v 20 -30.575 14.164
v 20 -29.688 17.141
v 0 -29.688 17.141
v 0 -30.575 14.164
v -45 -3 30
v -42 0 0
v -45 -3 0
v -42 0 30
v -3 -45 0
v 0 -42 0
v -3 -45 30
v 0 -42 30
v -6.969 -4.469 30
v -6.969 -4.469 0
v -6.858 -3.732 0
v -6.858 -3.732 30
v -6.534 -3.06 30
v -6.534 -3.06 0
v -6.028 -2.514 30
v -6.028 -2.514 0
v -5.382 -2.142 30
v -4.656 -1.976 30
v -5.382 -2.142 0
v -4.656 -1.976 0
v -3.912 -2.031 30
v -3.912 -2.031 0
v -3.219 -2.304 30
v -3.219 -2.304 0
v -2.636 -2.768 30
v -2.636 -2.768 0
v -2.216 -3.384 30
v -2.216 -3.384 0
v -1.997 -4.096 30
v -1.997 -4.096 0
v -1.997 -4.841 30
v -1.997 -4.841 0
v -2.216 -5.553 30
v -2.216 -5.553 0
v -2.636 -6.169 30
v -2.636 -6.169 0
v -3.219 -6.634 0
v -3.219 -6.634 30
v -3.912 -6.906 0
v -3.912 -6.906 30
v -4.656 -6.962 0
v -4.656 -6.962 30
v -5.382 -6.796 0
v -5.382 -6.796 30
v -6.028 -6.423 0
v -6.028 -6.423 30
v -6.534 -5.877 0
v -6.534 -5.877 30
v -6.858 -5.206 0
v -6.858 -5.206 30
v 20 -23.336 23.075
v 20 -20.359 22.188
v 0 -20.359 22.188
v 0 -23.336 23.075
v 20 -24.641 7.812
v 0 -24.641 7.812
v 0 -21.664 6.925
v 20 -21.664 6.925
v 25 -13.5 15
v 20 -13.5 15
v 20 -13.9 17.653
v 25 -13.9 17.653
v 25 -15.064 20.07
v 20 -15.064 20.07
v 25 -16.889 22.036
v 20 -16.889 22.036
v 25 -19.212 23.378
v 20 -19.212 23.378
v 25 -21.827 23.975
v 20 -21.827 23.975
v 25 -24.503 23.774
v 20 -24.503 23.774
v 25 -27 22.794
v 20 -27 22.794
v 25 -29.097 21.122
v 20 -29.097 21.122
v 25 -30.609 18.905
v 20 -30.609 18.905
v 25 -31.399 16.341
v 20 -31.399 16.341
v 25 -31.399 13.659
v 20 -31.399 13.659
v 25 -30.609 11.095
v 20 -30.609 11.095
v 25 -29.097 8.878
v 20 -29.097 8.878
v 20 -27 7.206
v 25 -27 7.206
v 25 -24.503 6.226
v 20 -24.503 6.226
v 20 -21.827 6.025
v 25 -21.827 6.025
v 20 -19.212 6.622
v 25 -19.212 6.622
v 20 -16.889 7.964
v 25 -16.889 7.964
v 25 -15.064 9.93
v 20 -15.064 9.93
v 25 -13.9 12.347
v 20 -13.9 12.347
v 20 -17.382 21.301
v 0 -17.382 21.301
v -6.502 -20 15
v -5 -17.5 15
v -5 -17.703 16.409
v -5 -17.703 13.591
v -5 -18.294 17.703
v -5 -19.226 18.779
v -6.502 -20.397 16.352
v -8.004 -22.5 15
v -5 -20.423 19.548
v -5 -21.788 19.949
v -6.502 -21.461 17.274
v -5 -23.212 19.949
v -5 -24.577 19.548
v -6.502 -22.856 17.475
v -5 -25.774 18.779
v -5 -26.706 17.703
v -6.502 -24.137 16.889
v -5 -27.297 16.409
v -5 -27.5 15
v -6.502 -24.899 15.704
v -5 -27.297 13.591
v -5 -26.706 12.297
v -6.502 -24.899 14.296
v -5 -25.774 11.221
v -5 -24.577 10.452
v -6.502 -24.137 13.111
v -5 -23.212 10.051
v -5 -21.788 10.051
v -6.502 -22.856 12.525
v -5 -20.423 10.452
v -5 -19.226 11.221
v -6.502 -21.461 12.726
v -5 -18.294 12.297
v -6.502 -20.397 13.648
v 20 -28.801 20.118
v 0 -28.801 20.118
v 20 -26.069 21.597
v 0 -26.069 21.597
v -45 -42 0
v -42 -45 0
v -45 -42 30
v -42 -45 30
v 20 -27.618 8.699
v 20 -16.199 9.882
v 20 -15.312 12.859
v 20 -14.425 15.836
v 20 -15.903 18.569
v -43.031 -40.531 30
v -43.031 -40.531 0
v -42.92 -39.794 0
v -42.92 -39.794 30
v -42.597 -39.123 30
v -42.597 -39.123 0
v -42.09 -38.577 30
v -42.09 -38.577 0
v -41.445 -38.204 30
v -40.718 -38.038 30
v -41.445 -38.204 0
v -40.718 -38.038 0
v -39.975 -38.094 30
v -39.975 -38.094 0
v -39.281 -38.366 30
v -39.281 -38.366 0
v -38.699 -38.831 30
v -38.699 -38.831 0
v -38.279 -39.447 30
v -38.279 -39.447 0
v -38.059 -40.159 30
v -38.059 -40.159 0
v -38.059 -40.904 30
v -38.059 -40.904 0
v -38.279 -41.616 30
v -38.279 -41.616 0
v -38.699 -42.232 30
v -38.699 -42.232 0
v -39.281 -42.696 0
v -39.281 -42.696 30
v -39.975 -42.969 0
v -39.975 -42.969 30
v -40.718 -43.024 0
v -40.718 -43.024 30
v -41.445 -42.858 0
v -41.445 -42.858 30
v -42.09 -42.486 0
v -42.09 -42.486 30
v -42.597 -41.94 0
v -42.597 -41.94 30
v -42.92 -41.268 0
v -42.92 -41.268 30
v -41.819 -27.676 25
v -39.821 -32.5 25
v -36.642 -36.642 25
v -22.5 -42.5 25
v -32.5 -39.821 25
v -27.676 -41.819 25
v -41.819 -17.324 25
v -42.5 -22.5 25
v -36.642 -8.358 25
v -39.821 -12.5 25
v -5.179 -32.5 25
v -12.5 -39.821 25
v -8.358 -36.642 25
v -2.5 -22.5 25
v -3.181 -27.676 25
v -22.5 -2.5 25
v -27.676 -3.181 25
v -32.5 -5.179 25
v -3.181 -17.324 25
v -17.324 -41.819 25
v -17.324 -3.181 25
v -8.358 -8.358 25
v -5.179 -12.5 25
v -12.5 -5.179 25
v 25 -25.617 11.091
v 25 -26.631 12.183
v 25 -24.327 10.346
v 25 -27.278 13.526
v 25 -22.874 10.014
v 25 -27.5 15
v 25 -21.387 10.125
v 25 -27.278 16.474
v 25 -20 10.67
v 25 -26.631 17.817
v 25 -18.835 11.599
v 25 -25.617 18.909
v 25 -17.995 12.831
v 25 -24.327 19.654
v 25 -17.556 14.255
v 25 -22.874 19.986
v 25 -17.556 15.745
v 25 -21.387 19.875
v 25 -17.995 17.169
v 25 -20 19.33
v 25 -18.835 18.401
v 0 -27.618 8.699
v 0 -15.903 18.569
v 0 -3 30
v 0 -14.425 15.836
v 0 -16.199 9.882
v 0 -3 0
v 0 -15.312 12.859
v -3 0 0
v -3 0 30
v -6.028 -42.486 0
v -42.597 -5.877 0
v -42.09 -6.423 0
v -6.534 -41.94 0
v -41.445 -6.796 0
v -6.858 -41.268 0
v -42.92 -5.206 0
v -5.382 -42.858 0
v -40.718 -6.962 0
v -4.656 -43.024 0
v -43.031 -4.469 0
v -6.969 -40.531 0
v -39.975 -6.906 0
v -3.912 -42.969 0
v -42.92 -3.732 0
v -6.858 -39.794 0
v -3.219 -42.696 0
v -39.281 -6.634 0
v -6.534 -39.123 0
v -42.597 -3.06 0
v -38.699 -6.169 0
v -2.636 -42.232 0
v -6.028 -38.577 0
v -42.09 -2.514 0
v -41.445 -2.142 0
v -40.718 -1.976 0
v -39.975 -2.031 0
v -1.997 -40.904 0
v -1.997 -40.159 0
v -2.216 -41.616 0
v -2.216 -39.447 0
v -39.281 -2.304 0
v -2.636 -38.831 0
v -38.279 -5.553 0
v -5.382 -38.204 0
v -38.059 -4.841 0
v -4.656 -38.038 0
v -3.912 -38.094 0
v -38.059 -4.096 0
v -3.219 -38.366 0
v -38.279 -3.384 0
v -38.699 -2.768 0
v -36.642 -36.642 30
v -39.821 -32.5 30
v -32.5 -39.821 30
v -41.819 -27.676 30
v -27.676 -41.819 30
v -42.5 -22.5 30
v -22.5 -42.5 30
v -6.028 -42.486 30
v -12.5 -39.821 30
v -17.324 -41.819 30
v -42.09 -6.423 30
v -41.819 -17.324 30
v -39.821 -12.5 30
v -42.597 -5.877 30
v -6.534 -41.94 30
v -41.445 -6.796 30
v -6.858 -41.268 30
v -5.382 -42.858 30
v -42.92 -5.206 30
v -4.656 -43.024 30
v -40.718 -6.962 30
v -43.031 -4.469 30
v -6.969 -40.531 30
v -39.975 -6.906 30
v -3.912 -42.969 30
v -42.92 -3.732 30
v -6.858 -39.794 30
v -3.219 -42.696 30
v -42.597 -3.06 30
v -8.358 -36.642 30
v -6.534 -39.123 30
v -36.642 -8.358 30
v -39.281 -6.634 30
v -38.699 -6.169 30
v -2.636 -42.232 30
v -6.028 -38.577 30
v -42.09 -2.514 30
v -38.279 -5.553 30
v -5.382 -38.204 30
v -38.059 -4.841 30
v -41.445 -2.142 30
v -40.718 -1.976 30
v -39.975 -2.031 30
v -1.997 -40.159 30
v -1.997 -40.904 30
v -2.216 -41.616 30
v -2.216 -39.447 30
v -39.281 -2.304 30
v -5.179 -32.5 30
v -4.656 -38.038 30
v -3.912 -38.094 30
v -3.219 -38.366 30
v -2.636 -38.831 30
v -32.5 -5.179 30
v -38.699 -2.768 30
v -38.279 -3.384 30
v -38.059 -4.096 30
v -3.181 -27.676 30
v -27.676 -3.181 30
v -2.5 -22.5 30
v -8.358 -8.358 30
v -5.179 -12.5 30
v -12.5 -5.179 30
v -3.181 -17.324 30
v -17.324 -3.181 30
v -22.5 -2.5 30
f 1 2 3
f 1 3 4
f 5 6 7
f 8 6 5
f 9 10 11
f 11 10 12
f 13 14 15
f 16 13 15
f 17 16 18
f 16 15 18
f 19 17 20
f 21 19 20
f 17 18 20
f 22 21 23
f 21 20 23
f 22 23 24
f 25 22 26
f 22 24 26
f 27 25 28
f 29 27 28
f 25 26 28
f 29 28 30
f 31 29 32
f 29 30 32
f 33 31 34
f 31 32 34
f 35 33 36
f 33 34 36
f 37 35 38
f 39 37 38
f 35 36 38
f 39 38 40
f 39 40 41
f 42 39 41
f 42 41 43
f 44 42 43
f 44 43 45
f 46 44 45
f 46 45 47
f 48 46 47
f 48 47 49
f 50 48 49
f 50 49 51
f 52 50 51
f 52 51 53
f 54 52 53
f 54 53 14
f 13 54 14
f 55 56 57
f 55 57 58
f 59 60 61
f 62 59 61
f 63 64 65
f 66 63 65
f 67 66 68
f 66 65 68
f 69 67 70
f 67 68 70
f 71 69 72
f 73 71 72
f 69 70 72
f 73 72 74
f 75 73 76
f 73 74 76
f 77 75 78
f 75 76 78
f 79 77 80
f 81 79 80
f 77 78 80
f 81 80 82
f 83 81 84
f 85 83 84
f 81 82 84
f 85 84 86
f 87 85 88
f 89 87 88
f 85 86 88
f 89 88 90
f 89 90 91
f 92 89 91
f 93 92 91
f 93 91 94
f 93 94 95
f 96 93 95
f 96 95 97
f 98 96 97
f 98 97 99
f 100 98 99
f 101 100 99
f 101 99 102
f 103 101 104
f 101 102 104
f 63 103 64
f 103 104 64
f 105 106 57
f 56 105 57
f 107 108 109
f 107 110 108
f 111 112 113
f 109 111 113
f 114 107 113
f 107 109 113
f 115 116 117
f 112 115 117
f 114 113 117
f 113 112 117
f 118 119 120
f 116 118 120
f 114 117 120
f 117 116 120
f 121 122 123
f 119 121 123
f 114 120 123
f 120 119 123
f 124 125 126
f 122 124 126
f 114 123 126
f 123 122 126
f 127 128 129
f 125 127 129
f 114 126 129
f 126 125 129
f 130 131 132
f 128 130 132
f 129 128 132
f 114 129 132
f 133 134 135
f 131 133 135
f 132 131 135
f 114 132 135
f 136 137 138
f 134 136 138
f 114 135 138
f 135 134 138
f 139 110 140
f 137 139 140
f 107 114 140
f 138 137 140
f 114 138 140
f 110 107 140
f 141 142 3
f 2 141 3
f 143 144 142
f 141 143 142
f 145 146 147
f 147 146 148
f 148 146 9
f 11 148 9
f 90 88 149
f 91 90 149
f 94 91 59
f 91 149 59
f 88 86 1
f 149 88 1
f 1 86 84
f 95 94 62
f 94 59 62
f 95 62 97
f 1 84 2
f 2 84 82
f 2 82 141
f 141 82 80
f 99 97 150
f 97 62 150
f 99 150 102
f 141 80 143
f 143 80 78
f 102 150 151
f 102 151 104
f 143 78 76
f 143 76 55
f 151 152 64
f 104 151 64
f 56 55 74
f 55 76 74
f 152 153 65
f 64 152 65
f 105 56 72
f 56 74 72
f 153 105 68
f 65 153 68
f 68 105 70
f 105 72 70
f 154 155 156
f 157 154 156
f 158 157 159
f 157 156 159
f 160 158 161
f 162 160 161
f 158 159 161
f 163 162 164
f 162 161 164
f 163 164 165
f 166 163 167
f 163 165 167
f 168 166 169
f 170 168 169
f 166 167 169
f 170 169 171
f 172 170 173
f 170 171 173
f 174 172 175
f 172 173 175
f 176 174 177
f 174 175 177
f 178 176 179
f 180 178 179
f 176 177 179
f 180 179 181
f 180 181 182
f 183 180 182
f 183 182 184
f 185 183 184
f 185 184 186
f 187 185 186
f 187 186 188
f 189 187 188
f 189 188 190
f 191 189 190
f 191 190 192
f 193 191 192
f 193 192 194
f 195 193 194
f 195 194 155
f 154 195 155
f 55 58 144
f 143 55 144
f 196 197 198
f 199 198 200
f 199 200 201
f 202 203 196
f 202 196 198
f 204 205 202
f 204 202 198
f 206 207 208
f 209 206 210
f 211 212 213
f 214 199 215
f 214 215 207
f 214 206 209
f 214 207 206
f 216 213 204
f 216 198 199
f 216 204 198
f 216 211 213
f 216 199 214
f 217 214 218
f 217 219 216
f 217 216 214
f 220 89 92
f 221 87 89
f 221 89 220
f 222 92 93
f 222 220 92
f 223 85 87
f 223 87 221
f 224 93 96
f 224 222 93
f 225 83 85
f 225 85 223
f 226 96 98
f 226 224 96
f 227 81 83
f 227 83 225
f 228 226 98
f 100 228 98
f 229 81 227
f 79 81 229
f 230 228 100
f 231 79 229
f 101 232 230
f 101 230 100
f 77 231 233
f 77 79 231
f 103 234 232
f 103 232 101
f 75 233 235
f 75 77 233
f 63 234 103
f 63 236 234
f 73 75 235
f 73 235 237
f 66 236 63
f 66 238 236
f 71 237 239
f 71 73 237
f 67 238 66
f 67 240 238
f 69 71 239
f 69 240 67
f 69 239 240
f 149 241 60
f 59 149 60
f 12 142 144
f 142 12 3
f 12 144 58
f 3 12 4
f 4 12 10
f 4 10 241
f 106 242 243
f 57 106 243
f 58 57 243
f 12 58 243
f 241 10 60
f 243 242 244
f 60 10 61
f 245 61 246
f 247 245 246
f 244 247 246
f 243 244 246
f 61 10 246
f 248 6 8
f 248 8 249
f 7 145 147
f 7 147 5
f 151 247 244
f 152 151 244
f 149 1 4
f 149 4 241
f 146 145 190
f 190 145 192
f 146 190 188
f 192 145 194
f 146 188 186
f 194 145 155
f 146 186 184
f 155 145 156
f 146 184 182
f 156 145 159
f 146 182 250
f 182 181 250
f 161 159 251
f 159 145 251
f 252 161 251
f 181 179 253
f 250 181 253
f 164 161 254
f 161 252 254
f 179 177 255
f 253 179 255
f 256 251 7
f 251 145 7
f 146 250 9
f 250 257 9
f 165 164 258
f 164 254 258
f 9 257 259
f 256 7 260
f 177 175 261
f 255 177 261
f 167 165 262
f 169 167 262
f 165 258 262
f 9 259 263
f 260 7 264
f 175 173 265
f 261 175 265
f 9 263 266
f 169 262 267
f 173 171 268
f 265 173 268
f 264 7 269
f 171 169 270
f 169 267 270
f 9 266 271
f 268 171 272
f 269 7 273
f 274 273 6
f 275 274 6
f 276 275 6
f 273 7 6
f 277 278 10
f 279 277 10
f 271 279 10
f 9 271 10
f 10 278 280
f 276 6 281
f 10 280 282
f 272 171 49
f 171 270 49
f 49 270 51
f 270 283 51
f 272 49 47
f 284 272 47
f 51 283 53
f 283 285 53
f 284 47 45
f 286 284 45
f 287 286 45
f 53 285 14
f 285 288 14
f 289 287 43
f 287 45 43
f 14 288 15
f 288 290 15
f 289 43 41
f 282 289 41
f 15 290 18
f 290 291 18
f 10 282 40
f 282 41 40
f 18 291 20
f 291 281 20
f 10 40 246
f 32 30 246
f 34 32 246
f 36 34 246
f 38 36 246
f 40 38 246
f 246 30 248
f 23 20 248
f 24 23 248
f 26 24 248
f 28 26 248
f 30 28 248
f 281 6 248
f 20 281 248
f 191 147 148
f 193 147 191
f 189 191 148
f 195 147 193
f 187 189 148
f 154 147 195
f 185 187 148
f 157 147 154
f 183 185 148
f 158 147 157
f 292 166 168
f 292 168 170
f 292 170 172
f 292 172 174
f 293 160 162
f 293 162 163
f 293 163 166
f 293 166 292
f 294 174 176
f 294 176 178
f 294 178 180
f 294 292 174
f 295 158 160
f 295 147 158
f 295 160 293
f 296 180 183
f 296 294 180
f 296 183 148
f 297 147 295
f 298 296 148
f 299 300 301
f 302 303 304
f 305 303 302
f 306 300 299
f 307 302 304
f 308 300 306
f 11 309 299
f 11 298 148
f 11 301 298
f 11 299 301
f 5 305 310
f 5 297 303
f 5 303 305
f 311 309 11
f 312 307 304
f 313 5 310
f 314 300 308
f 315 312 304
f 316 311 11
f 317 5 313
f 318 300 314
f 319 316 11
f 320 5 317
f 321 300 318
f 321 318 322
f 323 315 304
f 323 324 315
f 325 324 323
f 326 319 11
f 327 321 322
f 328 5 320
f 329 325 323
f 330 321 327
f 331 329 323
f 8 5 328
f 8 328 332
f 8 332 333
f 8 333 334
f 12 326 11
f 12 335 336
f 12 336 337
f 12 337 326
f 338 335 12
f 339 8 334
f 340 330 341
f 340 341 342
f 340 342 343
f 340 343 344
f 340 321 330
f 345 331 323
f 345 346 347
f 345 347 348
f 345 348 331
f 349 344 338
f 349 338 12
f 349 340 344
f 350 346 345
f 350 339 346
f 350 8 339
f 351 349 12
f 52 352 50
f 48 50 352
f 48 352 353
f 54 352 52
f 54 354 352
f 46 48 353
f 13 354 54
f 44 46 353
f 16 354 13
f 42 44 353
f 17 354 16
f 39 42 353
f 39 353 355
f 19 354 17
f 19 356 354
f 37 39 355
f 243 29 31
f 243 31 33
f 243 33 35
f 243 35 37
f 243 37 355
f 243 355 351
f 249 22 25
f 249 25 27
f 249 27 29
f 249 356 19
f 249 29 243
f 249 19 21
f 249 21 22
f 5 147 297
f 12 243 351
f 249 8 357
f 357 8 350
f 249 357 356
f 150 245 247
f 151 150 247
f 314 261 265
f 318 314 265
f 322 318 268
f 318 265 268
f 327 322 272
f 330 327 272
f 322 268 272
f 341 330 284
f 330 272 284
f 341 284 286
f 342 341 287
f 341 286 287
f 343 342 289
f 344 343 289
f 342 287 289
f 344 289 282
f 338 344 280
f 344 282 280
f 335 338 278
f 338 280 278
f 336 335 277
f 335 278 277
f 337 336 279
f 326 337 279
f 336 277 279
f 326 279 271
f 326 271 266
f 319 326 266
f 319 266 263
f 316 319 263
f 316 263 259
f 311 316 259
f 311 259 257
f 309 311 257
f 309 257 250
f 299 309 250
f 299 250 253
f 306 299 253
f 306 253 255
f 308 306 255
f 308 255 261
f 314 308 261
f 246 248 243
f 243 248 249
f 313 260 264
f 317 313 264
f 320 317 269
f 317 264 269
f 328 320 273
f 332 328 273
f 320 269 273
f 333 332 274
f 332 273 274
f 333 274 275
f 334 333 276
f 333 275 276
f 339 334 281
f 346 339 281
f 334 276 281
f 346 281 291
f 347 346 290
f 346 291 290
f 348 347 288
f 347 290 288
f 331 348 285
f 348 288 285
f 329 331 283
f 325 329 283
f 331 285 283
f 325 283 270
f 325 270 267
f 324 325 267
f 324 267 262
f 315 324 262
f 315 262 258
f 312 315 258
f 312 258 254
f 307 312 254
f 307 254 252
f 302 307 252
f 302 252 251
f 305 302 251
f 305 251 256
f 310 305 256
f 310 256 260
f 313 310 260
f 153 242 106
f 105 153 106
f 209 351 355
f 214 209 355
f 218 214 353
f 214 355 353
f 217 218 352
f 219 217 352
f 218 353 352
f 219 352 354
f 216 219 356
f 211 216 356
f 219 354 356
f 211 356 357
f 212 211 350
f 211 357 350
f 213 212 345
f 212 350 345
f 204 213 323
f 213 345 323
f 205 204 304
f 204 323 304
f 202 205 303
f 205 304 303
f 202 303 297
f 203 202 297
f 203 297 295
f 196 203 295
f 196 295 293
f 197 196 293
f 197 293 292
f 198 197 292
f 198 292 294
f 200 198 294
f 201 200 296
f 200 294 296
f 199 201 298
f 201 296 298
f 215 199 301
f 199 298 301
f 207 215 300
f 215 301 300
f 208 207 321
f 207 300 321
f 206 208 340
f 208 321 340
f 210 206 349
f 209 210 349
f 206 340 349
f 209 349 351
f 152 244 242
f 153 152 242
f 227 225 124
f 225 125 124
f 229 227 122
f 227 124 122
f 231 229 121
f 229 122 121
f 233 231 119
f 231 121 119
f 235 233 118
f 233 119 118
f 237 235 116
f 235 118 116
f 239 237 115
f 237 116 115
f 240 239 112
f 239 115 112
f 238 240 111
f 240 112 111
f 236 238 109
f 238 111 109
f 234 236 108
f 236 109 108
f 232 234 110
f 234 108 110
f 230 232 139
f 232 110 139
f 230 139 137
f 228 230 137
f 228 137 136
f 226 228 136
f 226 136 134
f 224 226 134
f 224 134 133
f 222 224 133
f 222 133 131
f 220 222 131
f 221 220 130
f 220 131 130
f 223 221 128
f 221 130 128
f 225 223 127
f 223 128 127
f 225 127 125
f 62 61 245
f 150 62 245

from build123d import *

# Parameters (mm, degrees)
F0_W      = 45
F0_H      = 45
F1_DEPTH  = 30
F2_SIZE   = 3
F4_D      = 5
F6_DEPTH  = 20
F7_R      = 9
F8_DEPTH  = 5
F10_D     = 10
F10_DEPTH = 30
F10_TIP   = 3.0043030951
F11_R     = 20
F12_DEPTH = 5


with BuildPart() as f1:
    # F0 (on Top) → F1 (new body)
    with BuildSketch(Plane.XY):
        with Locations((-22.5, -22.5)):
            Rectangle(F0_W, F0_H)
    extrude(amount=F1_DEPTH)

    # F2
    f2_edges = [f1.edges().sort_by_distance(p)[0] for p in [
        (-45, -45, 15),
        (0, -45, 15),
        (0, 0, 15),
        (-45, 0, 15),
    ]]
    chamfer(f2_edges, length=F2_SIZE)

    # F4 (through all)
    with Locations(Plane.XY.offset(30)):
        with Locations((-40.5312229203, -40.5312229203), (-40.5312229203, -4.4687770797), (-4.4687770797, -4.4687770797), (-4.4687770797, -40.5312229203)):
            Hole(F4_D / 2)

    # F5 (on face) → F6 (join)
    with BuildSketch(Plane.YZ):
        with BuildLine():
            ThreePointArc((-15.3121332332, 12.8588387864), (-15.0784435342, 13.9181036905), (-15, 15))
            ThreePointArc((-15, 15), (-15.2293520832, 16.8405648237), (-15.903381032, 18.5685596803))
            ThreePointArc((-15.903381032, 18.5685596803), (-17.7711474831, 20.8213360901), (-20.3588389028, 22.1878668015))
            ThreePointArc((-20.3588389028, 22.1878668015), (-23.2725024385, 22.4601099176), (-26.0685594955, 21.5966190679))
            ThreePointArc((-26.0685594955, 21.5966190679), (-28.3213359619, 19.7288526747), (-29.6878667454, 17.1411612856))
            ThreePointArc((-29.6878667454, 17.1411612856), (-29.9601099219, 14.2274976035), (-29.0966190145, 11.4314404058))
            ThreePointArc((-29.0966190145, 11.4314404058), (-27.2288526423, 9.1786640118), (-24.6411613131, 7.8121332628))
            ThreePointArc((-24.6411613131, 7.8121332628), (-21.7274976178, 7.5398900766), (-18.9314404058, 8.4033809855))
            ThreePointArc((-18.9314404058, 8.4033809855), (-16.6786639791, 10.271147398), (-15.3121332332, 12.8588387864))
        make_face()
        with BuildLine():
            ThreePointArc((-15.903381032, 18.5685596803), (-15.2293520832, 16.8405648237), (-15, 15))
            ThreePointArc((-15, 15), (-15.0784435342, 13.9181036905), (-15.3121332332, 12.8588387864))
            Line((-15.3121332332, 12.8588387864), (-14.4252352272, 15.8361507619))
            Line((-14.4252352272, 15.8361507619), (-15.903381032, 18.5685596803))
        make_face()
        with BuildLine():
            ThreePointArc((-20.3588389028, 22.1878668015), (-17.7711474831, 20.8213360901), (-15.903381032, 18.5685596803))
            Line((-15.903381032, 18.5685596803), (-17.3815269465, 21.3009688012))
            Line((-17.3815269465, 21.3009688012), (-20.3588389028, 22.1878668015))
        make_face()
        with BuildLine():
            Line((-16.1990311988, 9.8815269465), (-15.3121332332, 12.8588387864))
            ThreePointArc((-15.3121332332, 12.8588387864), (-16.6786639791, 10.271147398), (-18.9314404058, 8.4033809855))
            Line((-18.9314404058, 8.4033809855), (-16.1990311988, 9.8815269465))
        make_face()
        with BuildLine():
            ThreePointArc((-26.0685594955, 21.5966190679), (-23.2725024385, 22.4601099176), (-20.3588389028, 22.1878668015))
            Line((-20.3588389028, 22.1878668015), (-23.3361507619, 23.0747647728))
            Line((-23.3361507619, 23.0747647728), (-26.0685594955, 21.5966190679))
        make_face()
        with BuildLine():
            Line((-21.6638492381, 6.9252352272), (-18.9314404058, 8.4033809855))
            ThreePointArc((-18.9314404058, 8.4033809855), (-21.7274976178, 7.5398900766), (-24.6411613131, 7.8121332628))
            Line((-24.6411613131, 7.8121332628), (-21.6638492381, 6.9252352272))
        make_face()
        with BuildLine():
            ThreePointArc((-29.6878667454, 17.1411612856), (-28.3213359619, 19.7288526747), (-26.0685594955, 21.5966190679))
            Line((-26.0685594955, 21.5966190679), (-28.8009688012, 20.1184730535))
            Line((-28.8009688012, 20.1184730535), (-29.6878667454, 17.1411612856))
        make_face()
        with BuildLine():
            Line((-27.6184730535, 8.6990311988), (-24.6411613131, 7.8121332628))
            ThreePointArc((-24.6411613131, 7.8121332628), (-27.2288526423, 9.1786640118), (-29.0966190145, 11.4314404058))
            Line((-29.0966190145, 11.4314404058), (-27.6184730535, 8.6990311988))
        make_face()
        with BuildLine():
            ThreePointArc((-29.0966190145, 11.4314404058), (-29.9601099219, 14.2274976035), (-29.6878667454, 17.1411612856))
            Line((-29.6878667454, 17.1411612856), (-30.5747647728, 14.1638492381))
            Line((-30.5747647728, 14.1638492381), (-29.0966190145, 11.4314404058))
        make_face()
    extrude(amount=F6_DEPTH)

    # F7 (on face) → F8 (join)
    with BuildSketch(Plane.YZ.offset(20)):
        with Locations((-22.5, 15)):
            Circle(F7_R)
        Polygon((-29.687866787, 17.1411611458), (-22.5, 15), (-24.6411611458, 7.812133213), align=None, mode=Mode.SUBTRACT)
        Polygon((-24.6411611458, 7.812133213), (-22.5, 15), (-29.687866787, 17.1411611458), align=None)
    extrude(amount=F8_DEPTH)

    # F10
    with Locations(Plane.YZ.offset(25)):
        with Locations((-22.5, 15)):
            Hole(F10_D / 2, depth=F10_DEPTH)
            with Locations((0, 0, -(F10_DEPTH + F10_TIP / 2))):  # 118° drill point
                Cone(0, F10_D / 2, F10_TIP, mode=Mode.SUBTRACT)

    # F11 (on face) → F12 (cut)
    with BuildSketch(Plane.XY.offset(30)):
        with Locations((-22.5, -22.5)):
            Circle(F11_R)
    extrude(amount=-F12_DEPTH, mode=Mode.SUBTRACT)


solid = f1.part
